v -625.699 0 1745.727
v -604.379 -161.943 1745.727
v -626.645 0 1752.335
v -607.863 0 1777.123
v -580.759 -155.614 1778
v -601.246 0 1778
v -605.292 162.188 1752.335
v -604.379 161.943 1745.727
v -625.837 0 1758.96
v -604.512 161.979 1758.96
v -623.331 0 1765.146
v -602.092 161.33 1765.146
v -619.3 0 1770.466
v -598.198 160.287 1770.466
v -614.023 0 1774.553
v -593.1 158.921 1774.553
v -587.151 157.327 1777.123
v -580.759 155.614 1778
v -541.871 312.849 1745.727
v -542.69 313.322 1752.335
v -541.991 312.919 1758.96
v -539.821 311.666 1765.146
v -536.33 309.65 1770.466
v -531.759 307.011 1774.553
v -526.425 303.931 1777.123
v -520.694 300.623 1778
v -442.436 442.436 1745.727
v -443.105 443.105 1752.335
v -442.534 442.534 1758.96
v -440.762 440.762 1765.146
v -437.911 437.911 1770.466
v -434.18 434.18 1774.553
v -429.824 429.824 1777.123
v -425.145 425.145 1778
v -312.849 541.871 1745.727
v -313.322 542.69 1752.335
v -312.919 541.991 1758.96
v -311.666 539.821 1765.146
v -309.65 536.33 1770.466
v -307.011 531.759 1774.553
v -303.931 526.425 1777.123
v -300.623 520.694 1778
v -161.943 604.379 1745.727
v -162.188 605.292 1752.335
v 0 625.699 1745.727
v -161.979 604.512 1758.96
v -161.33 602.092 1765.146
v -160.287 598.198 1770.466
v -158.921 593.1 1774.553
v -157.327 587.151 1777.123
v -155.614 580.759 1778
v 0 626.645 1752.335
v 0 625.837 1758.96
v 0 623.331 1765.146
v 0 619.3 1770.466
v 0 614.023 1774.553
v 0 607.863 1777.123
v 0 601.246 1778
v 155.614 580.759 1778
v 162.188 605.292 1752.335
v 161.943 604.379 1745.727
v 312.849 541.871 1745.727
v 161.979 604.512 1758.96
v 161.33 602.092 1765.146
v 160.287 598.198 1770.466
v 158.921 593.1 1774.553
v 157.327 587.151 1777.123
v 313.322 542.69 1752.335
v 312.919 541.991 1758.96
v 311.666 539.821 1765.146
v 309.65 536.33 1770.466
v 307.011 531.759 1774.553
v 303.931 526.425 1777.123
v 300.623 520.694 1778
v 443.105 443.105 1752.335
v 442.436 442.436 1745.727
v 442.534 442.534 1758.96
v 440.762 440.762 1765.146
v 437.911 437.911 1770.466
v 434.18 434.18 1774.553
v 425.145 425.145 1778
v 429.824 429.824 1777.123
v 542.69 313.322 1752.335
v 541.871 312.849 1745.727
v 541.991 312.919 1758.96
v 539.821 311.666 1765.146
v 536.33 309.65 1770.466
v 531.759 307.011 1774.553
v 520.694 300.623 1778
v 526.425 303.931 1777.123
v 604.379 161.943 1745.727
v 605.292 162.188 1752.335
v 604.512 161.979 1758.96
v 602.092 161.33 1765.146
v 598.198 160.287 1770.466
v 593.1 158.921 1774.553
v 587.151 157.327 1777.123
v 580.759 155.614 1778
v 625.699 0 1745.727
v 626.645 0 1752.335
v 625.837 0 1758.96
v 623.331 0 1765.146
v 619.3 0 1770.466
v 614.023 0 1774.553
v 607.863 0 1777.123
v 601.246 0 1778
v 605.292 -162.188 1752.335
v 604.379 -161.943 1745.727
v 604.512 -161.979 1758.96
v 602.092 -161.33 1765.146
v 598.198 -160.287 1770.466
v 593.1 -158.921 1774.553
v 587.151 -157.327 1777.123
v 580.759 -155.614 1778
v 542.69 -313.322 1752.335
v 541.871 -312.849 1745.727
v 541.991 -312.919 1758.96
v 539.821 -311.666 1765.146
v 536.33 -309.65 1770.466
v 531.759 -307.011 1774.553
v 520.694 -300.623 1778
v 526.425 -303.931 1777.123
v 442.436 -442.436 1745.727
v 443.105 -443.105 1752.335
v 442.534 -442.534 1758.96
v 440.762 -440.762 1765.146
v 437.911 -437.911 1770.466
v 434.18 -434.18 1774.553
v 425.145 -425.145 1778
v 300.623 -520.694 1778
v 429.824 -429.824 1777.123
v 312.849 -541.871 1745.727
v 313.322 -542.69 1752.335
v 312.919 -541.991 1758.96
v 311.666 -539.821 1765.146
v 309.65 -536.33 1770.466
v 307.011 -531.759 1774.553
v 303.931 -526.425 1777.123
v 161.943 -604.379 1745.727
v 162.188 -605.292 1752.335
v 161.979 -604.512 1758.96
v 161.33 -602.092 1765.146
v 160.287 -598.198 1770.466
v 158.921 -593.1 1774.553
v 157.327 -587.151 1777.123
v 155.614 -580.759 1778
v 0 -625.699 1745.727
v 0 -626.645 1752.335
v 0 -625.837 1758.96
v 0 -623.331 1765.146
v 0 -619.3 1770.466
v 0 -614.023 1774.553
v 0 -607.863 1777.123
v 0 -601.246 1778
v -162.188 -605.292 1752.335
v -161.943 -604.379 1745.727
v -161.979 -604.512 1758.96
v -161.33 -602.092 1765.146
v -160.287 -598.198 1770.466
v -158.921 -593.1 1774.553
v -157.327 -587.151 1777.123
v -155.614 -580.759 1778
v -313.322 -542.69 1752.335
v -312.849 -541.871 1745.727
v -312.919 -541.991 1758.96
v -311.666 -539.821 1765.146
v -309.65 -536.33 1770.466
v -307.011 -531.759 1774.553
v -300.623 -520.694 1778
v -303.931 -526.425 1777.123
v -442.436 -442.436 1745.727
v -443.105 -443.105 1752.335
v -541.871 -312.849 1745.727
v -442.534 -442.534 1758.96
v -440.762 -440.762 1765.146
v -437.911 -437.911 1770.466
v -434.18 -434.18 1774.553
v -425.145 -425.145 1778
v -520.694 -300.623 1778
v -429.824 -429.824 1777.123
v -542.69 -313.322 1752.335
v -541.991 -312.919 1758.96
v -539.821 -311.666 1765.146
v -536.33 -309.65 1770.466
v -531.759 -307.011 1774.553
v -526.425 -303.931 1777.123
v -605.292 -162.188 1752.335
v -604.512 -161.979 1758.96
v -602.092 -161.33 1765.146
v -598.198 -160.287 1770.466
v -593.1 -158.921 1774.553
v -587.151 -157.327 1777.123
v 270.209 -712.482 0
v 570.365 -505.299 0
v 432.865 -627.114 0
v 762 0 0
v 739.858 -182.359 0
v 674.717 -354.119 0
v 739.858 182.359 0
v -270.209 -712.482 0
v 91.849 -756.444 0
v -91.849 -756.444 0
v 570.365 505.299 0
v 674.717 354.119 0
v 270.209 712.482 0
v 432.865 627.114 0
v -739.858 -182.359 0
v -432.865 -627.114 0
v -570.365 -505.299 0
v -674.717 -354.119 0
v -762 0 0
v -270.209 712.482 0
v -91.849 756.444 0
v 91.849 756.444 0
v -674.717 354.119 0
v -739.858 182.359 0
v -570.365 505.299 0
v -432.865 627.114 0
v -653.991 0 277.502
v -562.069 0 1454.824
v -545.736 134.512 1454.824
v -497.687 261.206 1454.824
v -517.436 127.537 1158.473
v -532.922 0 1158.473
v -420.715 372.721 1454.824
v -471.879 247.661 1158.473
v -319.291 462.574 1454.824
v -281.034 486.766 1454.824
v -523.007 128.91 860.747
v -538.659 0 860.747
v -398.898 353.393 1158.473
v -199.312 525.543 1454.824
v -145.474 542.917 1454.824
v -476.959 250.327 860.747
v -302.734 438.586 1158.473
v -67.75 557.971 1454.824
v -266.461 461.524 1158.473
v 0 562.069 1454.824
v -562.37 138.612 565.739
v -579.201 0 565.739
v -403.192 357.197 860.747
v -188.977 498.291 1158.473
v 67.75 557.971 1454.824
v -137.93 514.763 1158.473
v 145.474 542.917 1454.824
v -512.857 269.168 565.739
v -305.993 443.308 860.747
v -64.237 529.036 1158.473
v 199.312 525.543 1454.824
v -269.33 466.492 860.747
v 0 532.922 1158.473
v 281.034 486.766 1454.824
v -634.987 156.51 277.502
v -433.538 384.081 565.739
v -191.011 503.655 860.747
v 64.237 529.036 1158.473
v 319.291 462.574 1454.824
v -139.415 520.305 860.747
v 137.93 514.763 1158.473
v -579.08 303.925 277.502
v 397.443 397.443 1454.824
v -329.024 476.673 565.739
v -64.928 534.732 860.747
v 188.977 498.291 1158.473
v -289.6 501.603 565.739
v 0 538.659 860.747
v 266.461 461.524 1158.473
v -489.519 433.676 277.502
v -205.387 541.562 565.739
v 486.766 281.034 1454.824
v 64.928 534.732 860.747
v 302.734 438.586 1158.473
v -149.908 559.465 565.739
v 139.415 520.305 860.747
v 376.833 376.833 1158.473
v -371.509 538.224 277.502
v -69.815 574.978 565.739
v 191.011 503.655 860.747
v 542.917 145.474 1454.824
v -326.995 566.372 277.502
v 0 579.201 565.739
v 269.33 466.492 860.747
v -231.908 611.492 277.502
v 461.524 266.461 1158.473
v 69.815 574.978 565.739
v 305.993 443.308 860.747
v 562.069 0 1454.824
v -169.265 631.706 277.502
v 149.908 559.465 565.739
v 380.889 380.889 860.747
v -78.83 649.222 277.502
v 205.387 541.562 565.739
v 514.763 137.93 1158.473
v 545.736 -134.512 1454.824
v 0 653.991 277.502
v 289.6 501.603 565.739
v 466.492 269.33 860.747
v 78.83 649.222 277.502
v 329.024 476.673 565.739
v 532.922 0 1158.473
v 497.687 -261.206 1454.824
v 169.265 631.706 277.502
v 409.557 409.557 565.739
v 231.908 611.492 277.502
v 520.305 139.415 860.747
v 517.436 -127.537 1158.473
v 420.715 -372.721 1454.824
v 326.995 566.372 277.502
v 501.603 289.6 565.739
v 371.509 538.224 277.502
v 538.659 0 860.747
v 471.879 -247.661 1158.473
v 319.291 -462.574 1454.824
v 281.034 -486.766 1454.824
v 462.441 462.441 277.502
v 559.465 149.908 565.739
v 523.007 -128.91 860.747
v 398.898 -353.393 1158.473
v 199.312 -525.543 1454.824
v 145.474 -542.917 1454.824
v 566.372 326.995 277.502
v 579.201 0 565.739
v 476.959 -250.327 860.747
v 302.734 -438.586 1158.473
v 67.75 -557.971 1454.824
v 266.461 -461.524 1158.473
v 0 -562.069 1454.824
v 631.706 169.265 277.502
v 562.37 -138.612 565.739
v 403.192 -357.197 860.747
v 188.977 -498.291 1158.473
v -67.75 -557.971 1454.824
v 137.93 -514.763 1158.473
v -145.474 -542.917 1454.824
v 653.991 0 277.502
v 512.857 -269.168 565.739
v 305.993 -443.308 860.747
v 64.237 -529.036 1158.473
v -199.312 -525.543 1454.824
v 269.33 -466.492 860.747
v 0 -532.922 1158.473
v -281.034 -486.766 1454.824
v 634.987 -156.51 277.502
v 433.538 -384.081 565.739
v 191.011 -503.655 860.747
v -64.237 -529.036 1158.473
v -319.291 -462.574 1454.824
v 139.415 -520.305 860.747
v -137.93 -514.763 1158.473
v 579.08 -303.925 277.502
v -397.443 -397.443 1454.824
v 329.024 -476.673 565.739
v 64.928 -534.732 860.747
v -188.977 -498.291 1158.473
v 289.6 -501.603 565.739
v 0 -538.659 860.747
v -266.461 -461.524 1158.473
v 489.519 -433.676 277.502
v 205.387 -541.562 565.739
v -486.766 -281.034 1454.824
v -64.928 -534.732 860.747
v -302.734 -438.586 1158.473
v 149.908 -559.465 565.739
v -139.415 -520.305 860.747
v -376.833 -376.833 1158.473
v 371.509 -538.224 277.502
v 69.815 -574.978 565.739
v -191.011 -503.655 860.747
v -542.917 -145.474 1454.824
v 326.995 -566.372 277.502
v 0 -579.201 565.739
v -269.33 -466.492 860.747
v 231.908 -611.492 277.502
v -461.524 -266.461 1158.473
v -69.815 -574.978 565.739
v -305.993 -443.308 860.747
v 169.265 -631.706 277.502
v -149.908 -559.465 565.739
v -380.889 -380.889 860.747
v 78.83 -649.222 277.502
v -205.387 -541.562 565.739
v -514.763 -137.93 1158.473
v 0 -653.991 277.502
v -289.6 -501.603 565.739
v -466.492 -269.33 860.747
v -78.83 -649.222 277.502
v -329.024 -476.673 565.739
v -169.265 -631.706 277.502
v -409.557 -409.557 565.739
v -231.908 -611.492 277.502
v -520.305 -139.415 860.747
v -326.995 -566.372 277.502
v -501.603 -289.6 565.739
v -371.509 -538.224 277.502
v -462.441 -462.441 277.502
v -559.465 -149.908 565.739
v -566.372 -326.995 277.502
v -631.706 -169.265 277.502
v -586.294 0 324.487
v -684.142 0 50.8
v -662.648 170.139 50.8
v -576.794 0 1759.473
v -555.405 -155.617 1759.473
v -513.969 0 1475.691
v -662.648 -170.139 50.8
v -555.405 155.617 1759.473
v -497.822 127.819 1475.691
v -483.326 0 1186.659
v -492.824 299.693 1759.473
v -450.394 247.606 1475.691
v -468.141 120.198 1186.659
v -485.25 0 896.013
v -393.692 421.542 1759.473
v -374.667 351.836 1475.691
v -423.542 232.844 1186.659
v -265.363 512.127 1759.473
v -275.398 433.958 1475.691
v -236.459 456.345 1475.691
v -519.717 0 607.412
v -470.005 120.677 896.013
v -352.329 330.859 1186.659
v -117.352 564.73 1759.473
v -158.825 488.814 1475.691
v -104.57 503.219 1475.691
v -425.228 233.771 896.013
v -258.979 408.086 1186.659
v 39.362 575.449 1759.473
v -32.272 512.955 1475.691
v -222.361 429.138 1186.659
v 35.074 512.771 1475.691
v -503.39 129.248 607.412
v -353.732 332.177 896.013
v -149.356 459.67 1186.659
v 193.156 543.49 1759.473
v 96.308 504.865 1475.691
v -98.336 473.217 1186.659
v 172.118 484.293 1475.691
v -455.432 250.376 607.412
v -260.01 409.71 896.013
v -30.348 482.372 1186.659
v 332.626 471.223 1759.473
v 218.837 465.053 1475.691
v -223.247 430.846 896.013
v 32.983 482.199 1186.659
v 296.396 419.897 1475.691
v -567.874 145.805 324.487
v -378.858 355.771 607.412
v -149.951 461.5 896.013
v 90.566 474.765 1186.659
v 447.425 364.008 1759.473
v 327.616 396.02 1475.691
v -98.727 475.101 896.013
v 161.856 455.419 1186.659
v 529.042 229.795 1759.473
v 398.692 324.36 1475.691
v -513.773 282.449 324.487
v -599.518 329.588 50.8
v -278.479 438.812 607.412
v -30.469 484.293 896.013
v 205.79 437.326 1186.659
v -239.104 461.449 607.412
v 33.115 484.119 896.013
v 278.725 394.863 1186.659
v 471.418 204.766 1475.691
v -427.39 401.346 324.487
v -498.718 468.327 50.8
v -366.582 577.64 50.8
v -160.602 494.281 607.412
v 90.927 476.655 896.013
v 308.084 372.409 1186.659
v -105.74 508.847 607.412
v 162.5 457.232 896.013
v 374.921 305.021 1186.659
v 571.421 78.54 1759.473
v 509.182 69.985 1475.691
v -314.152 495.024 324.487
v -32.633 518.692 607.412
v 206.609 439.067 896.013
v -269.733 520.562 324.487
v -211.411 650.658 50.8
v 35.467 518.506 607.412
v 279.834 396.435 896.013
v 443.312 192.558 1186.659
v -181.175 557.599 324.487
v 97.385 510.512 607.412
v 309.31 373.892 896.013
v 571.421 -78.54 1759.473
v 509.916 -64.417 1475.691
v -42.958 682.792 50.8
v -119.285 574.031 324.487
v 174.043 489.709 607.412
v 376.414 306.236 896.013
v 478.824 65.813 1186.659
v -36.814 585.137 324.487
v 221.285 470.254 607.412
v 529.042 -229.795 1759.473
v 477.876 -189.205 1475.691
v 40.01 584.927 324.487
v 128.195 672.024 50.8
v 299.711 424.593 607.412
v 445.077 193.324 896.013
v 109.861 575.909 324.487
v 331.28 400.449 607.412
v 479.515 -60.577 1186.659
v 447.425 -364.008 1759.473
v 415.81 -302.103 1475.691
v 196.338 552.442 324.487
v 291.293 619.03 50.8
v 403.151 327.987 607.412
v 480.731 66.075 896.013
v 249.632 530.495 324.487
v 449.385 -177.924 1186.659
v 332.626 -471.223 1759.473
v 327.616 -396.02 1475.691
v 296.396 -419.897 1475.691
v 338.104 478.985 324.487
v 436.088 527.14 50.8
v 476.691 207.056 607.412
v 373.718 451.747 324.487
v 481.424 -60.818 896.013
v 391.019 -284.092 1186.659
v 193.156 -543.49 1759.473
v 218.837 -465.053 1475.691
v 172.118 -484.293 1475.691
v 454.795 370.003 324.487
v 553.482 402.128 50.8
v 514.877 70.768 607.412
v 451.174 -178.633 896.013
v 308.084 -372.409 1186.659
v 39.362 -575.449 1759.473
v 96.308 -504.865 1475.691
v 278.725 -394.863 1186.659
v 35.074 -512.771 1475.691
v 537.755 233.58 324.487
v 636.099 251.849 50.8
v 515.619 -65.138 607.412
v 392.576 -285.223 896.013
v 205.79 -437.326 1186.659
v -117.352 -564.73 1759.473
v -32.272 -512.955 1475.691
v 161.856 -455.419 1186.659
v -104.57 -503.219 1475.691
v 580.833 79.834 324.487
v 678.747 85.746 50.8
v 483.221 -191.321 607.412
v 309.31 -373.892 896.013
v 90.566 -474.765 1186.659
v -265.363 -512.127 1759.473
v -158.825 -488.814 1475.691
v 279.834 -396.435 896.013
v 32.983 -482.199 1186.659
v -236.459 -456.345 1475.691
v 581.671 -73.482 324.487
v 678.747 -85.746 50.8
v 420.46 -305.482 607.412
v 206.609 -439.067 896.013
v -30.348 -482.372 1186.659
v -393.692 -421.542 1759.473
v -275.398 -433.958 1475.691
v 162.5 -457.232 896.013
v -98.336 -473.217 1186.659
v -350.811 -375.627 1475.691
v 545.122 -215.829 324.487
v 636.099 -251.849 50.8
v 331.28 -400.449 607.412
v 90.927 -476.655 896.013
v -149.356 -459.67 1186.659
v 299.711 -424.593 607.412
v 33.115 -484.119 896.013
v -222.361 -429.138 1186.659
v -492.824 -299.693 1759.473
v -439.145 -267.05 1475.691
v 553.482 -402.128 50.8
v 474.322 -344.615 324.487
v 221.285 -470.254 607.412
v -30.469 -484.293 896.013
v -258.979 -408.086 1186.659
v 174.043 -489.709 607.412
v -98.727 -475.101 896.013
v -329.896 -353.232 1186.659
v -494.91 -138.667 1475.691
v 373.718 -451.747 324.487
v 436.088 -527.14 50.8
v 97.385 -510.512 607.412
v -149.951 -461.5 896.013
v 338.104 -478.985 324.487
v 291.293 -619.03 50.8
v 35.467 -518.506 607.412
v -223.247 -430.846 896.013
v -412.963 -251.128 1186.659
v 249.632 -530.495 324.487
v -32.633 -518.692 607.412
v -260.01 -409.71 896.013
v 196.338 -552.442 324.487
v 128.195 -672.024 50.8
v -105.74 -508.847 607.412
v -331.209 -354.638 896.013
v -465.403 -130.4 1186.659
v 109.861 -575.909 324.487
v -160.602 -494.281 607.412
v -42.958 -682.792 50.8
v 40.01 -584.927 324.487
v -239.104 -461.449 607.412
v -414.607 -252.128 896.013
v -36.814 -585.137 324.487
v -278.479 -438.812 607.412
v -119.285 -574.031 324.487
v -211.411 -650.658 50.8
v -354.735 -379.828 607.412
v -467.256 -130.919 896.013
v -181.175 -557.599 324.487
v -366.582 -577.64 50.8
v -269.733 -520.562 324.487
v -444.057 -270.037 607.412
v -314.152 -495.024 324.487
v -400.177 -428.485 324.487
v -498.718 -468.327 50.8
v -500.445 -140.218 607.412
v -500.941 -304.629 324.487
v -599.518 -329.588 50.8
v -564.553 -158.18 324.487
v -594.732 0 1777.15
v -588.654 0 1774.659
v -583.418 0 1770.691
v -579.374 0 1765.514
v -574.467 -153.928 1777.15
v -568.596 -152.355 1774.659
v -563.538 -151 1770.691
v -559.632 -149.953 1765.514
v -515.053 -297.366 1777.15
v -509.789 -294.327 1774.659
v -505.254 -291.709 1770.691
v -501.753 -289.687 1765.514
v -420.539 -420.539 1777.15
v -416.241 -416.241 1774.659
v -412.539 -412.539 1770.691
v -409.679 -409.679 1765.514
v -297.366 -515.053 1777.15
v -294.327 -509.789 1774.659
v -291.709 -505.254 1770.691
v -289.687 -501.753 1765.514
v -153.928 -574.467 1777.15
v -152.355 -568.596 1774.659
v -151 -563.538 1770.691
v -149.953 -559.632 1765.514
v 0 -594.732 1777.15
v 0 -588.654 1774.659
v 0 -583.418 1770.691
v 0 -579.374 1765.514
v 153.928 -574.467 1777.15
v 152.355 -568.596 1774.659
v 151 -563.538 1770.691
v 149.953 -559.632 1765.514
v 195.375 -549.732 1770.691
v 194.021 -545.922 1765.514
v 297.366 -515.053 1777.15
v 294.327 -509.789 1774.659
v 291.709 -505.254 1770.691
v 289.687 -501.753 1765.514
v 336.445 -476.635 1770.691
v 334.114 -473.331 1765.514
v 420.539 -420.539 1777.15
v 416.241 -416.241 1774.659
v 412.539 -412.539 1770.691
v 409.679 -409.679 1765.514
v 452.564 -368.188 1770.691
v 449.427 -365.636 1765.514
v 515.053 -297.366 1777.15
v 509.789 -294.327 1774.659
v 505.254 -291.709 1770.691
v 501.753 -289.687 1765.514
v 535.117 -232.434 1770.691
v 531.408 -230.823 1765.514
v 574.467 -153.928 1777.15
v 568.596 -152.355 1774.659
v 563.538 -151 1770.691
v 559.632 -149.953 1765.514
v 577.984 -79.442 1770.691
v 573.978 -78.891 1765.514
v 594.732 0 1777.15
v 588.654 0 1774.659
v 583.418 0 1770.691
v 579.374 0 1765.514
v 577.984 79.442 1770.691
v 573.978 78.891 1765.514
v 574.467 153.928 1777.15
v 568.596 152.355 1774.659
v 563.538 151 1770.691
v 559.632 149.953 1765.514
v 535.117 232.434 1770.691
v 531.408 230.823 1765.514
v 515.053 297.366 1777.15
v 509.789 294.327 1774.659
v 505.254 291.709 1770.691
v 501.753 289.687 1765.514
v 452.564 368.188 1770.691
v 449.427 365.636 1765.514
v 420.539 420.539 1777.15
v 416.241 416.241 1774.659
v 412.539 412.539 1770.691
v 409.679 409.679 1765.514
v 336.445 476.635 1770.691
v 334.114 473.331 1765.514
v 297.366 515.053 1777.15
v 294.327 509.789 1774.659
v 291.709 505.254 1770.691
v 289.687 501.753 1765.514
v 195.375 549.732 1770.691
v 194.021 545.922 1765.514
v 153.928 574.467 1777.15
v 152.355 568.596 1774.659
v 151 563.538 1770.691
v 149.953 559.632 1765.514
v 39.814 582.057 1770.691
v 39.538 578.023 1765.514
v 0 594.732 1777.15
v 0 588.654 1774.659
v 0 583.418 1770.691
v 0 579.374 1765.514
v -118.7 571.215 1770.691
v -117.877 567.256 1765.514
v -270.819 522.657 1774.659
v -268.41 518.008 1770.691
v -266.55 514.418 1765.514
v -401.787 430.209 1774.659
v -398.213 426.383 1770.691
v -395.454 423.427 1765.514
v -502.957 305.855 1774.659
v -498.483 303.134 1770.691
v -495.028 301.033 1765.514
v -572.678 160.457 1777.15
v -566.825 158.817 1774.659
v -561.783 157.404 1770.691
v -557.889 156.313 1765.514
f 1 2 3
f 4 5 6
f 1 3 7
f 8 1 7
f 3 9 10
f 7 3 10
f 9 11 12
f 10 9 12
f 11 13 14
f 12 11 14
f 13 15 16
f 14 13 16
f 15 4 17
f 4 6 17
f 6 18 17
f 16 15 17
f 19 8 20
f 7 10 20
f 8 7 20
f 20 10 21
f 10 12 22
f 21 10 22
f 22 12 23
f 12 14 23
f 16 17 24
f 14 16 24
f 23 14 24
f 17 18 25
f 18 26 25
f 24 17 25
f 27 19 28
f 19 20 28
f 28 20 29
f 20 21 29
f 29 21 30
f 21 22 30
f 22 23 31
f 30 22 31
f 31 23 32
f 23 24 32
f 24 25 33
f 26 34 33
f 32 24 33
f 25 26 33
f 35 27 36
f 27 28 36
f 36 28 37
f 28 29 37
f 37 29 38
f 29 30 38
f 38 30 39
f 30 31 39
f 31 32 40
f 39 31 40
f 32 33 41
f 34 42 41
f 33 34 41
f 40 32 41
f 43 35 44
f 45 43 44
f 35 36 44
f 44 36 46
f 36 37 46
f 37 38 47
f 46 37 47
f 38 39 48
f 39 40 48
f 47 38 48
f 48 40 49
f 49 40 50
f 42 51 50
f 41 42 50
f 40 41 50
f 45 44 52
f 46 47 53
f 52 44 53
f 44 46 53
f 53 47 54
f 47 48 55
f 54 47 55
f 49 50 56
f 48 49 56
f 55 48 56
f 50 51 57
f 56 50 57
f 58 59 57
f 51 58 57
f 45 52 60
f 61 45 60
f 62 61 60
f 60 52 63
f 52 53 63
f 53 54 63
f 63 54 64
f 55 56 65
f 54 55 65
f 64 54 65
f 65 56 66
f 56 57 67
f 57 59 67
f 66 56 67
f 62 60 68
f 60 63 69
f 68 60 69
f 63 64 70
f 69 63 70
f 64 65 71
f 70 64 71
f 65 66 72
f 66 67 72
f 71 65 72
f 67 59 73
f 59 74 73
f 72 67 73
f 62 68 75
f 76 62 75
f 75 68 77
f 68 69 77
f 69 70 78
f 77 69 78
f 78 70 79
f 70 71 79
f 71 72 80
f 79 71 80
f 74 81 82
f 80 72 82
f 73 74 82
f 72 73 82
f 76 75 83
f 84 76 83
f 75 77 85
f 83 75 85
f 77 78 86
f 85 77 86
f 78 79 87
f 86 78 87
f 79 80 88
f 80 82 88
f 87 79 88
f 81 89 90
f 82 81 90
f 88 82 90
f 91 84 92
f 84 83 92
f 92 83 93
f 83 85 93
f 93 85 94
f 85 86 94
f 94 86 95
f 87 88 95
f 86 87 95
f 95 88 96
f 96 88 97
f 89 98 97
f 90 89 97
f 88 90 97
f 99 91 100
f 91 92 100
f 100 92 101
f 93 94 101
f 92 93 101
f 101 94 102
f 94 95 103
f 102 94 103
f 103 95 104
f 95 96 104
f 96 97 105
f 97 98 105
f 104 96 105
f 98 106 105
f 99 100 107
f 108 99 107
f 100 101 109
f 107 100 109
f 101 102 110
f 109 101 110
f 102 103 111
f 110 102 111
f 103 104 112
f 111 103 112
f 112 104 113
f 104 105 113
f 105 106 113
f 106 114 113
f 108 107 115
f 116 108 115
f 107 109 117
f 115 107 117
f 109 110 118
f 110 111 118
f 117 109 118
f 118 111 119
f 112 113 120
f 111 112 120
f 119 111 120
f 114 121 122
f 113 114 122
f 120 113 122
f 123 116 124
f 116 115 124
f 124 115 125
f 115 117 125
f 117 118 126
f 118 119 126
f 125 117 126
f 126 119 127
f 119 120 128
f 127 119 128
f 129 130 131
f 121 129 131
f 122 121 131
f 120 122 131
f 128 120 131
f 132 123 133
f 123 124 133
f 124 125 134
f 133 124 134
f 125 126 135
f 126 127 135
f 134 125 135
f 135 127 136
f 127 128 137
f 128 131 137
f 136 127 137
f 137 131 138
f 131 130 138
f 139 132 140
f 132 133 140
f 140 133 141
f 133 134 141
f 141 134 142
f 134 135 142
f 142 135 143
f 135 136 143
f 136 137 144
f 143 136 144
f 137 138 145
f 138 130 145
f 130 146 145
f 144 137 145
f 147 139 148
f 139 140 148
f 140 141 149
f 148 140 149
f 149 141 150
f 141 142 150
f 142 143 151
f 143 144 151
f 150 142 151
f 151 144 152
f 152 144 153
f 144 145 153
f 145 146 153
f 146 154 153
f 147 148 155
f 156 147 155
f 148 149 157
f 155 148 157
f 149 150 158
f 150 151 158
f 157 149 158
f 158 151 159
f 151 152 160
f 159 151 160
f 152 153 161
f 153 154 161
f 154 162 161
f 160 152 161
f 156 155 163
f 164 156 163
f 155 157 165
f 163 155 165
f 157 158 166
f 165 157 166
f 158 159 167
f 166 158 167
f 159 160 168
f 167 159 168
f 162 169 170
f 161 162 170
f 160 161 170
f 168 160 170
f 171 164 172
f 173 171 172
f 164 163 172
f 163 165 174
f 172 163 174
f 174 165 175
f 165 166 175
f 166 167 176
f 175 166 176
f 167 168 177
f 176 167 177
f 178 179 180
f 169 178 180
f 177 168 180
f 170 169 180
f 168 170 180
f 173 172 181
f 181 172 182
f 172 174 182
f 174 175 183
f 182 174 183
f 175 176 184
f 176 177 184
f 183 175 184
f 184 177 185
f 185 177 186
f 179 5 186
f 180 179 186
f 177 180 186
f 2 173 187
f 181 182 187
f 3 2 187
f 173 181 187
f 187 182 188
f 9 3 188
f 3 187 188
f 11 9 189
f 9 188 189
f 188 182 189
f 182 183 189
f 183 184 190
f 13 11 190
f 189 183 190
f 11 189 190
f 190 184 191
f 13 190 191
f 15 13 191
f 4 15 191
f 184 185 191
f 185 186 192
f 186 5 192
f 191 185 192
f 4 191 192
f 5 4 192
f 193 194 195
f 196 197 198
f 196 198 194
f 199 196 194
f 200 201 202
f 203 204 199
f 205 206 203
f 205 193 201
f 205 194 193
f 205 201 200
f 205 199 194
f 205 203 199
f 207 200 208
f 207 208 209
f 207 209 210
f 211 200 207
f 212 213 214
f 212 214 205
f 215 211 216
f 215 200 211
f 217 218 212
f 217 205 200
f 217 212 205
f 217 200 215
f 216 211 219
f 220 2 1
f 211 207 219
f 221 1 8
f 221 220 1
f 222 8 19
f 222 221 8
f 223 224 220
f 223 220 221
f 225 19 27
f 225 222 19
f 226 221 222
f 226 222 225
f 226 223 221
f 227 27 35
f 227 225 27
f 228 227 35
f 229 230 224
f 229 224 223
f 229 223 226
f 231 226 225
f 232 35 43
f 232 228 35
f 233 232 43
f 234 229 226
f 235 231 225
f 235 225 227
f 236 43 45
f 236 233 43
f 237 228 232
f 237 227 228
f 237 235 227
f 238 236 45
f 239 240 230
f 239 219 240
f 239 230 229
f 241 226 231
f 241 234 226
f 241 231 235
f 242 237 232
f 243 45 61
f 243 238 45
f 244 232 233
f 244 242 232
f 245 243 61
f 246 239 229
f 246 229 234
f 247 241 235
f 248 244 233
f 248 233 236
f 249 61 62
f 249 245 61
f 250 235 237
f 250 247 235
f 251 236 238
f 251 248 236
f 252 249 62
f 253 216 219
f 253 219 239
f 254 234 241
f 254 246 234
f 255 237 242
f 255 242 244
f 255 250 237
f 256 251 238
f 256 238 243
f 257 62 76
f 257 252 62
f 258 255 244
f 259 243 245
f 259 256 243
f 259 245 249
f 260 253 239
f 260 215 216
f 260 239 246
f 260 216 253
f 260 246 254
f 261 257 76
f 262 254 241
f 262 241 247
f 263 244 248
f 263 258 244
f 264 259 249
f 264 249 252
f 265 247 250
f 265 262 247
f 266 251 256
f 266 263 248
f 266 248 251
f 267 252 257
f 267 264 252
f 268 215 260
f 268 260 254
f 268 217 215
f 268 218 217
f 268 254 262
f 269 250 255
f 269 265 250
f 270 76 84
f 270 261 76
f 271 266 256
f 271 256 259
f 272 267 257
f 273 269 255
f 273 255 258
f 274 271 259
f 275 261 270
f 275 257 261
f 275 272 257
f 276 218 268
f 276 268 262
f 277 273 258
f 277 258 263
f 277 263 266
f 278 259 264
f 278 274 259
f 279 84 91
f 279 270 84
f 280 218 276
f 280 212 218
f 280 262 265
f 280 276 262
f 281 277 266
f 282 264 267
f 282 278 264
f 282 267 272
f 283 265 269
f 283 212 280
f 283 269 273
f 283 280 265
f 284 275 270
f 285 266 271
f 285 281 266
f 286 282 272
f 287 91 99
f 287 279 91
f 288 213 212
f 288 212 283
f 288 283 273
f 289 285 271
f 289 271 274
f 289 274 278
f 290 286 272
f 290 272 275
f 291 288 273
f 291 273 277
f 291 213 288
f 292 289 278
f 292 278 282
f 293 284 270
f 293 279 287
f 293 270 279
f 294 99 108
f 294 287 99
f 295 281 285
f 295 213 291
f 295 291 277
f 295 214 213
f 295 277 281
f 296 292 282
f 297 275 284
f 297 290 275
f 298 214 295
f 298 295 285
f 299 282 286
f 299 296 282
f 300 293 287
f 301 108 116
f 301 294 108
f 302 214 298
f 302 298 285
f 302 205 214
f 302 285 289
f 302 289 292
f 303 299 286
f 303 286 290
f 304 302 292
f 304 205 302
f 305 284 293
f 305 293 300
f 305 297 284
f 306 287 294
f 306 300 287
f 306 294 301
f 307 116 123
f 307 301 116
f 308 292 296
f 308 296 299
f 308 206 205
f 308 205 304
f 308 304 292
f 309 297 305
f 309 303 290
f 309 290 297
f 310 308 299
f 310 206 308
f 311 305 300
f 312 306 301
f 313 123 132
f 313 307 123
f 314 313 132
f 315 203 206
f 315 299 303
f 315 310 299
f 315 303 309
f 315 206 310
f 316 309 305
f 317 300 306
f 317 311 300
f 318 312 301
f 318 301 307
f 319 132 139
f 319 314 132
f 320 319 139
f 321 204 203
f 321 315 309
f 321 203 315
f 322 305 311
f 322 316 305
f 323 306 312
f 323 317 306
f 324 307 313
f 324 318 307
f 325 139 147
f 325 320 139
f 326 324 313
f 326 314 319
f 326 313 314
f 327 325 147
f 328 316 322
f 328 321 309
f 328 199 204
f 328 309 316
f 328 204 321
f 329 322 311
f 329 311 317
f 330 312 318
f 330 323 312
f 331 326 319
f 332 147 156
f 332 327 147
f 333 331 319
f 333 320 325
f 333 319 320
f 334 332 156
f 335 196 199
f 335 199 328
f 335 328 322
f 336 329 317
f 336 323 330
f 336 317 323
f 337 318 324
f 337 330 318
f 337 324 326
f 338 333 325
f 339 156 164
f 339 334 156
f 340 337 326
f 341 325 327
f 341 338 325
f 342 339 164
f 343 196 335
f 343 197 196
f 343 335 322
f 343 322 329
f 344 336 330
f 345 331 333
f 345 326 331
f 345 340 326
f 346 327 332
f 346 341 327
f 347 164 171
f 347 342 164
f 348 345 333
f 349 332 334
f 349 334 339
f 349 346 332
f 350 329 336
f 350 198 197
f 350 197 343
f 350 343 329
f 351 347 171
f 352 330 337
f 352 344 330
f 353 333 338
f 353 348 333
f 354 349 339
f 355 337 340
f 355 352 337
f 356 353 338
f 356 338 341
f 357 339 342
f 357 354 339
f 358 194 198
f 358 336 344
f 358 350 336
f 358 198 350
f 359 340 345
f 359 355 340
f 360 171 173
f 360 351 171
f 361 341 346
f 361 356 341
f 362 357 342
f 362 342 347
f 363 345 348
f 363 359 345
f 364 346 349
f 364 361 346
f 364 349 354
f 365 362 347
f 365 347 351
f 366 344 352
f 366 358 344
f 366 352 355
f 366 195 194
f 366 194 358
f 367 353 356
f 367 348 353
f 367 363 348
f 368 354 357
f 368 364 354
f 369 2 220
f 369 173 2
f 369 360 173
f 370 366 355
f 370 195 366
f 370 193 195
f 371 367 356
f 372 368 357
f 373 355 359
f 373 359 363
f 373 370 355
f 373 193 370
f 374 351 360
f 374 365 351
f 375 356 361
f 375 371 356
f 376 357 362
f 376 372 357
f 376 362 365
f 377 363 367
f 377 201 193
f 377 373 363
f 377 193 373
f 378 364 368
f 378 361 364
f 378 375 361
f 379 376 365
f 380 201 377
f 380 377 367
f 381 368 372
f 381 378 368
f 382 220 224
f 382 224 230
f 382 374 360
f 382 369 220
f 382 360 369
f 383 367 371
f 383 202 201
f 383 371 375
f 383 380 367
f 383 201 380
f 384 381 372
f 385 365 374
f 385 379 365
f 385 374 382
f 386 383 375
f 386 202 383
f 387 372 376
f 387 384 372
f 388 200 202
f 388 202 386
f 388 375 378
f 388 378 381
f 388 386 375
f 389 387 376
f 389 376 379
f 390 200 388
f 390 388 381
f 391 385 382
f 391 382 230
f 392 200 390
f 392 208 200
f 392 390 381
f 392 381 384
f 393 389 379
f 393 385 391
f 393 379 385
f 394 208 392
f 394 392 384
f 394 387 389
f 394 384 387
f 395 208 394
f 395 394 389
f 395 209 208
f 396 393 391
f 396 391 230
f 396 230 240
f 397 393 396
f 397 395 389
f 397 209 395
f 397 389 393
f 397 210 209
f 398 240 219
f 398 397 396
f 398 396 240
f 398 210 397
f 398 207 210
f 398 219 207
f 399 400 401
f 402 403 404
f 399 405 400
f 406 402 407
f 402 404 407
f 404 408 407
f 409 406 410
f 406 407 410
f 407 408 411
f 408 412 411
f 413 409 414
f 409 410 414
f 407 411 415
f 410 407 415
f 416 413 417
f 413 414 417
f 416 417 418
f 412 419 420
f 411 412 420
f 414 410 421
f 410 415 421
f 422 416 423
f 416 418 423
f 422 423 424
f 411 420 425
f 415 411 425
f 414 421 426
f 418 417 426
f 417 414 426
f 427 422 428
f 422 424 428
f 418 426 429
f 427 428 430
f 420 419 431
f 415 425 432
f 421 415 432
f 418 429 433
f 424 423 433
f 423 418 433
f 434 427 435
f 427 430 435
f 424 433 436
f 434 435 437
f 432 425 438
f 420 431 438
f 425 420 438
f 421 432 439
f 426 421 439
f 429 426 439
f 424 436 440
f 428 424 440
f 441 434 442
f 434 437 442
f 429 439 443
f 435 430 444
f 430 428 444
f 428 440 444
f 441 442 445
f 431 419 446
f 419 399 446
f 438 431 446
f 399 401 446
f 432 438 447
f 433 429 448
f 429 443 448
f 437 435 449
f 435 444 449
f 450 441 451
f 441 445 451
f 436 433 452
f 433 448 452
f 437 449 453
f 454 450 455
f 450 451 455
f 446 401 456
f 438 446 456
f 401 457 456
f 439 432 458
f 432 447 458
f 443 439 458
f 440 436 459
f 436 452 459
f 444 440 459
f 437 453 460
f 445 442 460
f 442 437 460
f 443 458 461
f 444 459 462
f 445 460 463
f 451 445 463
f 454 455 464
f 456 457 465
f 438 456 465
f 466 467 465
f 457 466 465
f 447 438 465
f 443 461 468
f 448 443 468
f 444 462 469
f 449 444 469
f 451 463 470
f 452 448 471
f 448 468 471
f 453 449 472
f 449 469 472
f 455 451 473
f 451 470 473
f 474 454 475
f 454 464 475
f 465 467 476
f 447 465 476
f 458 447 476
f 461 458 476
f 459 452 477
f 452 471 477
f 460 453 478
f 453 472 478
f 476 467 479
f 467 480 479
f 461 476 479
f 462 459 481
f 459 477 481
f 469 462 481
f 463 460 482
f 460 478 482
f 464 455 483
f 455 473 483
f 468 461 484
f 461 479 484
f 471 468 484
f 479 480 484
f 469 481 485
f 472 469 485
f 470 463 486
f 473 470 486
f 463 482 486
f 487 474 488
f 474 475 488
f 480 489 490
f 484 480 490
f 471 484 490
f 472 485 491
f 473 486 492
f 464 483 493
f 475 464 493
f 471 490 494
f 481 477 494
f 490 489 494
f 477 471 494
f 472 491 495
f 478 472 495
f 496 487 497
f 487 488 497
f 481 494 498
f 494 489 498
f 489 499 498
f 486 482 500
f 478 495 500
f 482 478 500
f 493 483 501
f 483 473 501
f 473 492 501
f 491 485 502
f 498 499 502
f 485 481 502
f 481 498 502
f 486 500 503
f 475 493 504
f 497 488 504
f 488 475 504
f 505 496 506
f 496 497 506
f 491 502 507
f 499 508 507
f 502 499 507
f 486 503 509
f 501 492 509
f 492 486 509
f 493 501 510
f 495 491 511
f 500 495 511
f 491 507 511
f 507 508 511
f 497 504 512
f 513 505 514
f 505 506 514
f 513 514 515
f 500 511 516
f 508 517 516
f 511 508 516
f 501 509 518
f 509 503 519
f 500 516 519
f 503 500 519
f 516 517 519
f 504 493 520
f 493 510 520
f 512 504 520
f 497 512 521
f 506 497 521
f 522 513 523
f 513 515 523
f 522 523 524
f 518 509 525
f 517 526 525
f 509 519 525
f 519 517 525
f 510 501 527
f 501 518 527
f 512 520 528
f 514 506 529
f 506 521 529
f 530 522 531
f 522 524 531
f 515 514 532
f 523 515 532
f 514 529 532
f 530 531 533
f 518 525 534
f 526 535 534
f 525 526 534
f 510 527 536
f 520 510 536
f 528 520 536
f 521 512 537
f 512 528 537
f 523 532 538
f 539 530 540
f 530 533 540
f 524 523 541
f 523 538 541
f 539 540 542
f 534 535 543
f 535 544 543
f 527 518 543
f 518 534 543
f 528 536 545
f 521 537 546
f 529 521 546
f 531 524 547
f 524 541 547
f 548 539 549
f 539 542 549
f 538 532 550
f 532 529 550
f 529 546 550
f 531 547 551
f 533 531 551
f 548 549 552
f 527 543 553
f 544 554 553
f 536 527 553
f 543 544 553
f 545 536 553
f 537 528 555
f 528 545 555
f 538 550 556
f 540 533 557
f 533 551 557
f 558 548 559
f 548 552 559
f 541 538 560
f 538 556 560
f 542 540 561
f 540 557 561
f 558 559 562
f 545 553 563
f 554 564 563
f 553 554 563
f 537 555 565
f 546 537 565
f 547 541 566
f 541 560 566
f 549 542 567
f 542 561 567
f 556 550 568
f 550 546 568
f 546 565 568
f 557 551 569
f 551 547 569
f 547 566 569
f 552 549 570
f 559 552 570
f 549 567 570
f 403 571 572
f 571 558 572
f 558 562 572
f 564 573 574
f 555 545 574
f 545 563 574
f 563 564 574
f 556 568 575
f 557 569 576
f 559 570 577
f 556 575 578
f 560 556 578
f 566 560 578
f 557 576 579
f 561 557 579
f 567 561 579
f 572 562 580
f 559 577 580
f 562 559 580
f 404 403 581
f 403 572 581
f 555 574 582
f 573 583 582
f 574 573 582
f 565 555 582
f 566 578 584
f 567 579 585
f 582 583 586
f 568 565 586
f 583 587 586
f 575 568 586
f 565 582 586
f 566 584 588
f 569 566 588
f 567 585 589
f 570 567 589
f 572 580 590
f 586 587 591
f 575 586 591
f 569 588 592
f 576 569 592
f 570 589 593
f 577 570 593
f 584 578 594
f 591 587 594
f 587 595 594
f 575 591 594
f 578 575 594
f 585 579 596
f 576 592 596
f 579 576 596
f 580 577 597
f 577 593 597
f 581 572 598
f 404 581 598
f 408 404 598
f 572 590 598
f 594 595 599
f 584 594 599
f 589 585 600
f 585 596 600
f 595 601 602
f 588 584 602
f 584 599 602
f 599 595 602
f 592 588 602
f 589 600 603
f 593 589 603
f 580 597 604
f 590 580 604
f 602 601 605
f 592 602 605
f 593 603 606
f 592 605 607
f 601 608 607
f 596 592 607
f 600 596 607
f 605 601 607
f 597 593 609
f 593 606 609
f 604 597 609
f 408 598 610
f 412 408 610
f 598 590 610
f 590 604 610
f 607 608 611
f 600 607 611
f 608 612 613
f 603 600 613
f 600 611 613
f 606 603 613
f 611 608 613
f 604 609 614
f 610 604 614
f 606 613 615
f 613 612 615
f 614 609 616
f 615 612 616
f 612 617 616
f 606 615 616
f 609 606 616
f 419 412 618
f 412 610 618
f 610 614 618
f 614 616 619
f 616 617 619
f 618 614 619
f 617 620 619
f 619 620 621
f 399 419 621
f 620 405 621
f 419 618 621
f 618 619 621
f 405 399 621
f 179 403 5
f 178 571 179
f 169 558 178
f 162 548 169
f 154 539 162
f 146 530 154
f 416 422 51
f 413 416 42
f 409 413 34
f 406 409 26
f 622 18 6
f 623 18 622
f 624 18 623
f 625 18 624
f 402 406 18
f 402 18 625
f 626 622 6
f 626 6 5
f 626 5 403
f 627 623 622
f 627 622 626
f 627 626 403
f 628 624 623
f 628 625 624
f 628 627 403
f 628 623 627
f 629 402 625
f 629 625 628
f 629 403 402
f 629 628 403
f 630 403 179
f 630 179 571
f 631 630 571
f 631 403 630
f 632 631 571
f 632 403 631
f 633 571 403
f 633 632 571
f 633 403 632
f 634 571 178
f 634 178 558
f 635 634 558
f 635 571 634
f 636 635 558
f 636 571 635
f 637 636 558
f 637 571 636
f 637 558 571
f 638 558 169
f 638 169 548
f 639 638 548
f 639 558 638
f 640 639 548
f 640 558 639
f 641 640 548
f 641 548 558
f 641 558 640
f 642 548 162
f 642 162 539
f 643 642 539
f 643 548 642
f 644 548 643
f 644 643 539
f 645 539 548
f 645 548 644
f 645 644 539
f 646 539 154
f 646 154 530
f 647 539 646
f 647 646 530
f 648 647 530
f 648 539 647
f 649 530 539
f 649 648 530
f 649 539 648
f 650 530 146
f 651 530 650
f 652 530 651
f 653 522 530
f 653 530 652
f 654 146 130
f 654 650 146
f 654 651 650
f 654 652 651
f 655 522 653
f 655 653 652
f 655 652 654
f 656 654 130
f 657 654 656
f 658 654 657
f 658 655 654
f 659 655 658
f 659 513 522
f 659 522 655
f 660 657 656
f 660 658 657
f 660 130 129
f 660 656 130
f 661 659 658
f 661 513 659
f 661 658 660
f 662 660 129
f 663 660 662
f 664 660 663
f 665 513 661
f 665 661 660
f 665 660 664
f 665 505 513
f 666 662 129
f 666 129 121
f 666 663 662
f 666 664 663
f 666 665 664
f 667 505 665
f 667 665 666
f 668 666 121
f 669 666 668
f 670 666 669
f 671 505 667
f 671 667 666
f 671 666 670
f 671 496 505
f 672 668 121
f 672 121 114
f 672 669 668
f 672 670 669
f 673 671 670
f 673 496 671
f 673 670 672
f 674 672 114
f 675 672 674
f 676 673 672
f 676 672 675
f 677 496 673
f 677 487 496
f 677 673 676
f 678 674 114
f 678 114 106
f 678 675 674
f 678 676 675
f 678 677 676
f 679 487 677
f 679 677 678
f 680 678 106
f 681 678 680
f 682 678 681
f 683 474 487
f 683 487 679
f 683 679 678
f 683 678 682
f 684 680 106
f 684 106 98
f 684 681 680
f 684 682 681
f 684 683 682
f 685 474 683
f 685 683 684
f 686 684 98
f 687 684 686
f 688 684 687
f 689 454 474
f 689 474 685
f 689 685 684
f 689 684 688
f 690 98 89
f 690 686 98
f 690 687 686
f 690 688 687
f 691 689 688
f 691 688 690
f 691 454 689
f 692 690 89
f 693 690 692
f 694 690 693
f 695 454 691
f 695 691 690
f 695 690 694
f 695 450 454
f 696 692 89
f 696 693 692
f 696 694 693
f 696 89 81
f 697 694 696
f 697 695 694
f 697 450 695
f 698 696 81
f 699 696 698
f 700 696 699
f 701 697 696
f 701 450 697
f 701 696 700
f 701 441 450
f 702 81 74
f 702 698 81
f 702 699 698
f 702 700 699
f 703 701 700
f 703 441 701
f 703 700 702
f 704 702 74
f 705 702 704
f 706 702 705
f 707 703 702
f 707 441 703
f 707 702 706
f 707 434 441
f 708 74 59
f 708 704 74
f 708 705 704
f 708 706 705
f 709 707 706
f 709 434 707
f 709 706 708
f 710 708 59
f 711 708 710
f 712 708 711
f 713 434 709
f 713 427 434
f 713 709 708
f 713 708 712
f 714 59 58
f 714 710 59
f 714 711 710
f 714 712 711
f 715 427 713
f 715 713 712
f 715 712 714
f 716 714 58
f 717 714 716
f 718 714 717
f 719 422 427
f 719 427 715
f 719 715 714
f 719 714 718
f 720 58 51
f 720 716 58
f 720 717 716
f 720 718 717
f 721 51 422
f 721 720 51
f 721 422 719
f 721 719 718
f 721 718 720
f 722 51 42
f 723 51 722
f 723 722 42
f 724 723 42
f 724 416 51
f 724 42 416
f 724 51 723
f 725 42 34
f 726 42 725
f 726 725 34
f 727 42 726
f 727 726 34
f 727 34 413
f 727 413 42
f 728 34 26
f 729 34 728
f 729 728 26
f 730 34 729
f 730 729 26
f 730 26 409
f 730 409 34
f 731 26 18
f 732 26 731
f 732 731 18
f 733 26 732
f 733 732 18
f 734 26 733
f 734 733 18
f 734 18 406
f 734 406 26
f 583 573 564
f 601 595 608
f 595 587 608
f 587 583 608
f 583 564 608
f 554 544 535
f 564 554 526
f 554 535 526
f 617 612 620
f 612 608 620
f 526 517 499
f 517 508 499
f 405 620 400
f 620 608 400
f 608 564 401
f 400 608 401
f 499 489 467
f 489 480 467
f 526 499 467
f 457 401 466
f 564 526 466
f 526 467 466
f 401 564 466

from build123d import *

# Parameters (mm, degrees)
F2_T = -50.8


# Not quite as in the source:
# - a fillet or chamfer that OpenCascade refuses, or shapes differently, is made with other operations: its cross-section is extruded or revolved along the edge and cut away or added


with BuildPart() as f1:
    # F0 (on Front) → F1 (revolve)
    with BuildSketch(Plane.XZ):
        with BuildLine():
            Line((-762, 0), (0, 0))
            Line((0, 0), (0, 1778))
            Line((0, 1778), (-635, 1778))
            ThreePointArc((-635, 1778), (-537.4071698995, 877.4933692785), (-762, 0))
        make_face()
    revolve(axis=Axis((0, 0, 889), (0, 0, -1)))

    # F2
    f2_openings = [f1.faces().sort_by_distance(p)[0] for p in [
        (0, 0, 1778),
    ]]
    offset(amount=F2_T, openings=f2_openings)

    # F3: fillet of radius 25.4 on 2 edges, made by hand

    # F3_s1 → F3_t2 (revolve, cut)
    with BuildSketch(Plane.XZ):
        with BuildLine():
            ThreePointArc((-601.2462046198, 1778), (-585.9068056848, 1772.845069531), (-576.7936693441, 1759.4726645916))
            ThreePointArc((-576.7936693441, 1759.4726645916), (-579.4173103836, 1768.7412417508), (-582.075394382, 1778))
            Line((-582.075394382, 1778), (-601.2462046198, 1778))
        make_face()
    revolve(axis=Axis((0, 0, 1778), (0, 0, 1)), mode=Mode.SUBTRACT)

    # F3_s3 → F3_t4 (revolve, cut)
    with BuildSketch(Plane.XZ):
        with BuildLine():
            ThreePointArc((-625.6987398956, 1745.7273354084), (-621.4912741508, 1767.939398935), (-601.2462046198, 1778))
            Line((-601.2462046198, 1778), (-635, 1778))
            ThreePointArc((-635, 1778), (-630.296026904, 1761.8790416292), (-625.6987398956, 1745.7273354084))
        make_face()
    revolve(axis=Axis((0, 0, 1778), (0, 0, -1)), mode=Mode.SUBTRACT)


solid = f1.part
